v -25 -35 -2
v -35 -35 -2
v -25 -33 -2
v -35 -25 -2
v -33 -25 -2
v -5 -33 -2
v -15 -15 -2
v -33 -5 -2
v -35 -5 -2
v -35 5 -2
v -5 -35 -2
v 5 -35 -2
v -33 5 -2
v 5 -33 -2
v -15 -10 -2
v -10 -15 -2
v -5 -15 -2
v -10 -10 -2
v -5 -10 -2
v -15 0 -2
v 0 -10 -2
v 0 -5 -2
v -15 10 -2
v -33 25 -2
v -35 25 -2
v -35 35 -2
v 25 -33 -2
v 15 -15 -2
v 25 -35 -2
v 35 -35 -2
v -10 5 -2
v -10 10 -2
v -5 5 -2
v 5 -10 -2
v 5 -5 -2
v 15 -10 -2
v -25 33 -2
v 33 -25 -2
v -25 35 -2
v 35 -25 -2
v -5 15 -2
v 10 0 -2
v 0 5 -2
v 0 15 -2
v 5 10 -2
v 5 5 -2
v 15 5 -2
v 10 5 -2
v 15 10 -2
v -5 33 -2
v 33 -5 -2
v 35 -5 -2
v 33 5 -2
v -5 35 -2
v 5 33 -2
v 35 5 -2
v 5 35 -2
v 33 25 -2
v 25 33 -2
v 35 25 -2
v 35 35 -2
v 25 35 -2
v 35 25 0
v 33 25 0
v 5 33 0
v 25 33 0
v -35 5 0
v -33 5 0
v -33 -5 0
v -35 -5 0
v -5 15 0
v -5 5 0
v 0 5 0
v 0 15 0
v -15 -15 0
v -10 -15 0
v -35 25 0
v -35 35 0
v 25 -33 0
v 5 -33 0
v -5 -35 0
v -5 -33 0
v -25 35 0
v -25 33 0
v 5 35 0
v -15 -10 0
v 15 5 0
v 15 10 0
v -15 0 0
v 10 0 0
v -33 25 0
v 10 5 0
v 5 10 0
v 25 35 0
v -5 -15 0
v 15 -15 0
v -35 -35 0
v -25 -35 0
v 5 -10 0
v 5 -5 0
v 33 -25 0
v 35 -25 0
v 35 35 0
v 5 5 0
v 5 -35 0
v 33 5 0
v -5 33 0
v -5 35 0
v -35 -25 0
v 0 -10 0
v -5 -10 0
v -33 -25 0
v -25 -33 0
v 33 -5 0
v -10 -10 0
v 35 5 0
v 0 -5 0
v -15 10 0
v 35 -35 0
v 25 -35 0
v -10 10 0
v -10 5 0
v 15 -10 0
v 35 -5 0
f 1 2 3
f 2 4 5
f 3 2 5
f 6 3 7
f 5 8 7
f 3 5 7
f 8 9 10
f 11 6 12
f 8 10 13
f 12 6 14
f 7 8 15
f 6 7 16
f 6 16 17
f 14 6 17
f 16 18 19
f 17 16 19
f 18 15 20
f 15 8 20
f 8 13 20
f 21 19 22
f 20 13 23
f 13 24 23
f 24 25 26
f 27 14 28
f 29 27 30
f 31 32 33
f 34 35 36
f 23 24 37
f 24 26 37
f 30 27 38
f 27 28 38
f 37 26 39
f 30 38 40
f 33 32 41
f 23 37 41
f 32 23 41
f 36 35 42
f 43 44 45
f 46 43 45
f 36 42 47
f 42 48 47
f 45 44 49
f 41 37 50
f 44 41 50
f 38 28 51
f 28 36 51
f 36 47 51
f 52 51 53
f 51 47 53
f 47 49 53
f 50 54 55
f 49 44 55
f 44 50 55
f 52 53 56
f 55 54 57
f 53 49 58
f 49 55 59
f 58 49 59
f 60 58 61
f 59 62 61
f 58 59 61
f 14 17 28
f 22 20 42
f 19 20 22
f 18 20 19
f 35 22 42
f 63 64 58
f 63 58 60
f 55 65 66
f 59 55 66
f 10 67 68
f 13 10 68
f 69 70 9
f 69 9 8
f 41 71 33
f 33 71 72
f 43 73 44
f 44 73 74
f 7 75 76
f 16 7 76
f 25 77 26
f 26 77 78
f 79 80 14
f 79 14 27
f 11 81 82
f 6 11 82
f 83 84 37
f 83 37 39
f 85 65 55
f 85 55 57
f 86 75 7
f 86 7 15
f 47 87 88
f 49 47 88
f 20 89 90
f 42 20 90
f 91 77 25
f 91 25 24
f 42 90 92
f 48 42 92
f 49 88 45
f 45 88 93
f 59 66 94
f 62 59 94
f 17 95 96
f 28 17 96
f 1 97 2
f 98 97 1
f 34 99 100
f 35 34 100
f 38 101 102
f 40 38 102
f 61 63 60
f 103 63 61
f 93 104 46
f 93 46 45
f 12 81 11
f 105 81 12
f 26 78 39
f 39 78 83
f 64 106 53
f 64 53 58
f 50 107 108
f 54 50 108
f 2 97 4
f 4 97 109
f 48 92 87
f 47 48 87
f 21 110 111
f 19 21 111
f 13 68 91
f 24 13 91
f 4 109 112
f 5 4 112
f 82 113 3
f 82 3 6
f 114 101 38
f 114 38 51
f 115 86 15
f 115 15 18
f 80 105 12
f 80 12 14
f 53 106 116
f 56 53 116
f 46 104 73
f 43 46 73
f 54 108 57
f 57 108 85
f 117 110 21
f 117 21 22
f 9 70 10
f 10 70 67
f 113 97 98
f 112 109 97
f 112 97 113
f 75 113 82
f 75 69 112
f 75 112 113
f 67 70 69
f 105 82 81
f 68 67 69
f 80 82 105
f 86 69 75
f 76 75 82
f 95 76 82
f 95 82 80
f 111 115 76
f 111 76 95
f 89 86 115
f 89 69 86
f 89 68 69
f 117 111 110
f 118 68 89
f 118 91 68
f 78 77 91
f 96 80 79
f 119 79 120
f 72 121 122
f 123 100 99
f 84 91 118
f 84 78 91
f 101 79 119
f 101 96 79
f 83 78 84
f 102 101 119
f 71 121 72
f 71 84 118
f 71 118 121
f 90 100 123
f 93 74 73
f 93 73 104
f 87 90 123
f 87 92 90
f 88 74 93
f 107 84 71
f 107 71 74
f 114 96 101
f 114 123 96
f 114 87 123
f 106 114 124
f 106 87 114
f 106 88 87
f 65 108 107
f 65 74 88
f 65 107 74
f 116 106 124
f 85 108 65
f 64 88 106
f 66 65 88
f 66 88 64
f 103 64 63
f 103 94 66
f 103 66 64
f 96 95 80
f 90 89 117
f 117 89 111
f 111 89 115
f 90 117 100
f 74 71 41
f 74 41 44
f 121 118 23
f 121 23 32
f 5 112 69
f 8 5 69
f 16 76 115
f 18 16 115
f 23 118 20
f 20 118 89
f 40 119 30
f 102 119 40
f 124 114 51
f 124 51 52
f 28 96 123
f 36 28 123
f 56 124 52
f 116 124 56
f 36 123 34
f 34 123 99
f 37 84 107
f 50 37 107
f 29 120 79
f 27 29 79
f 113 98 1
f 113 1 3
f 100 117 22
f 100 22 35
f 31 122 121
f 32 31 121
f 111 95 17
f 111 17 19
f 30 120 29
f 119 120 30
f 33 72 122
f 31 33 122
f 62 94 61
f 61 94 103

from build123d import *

# Parameters (mm, degrees)
SKETCH1_W           = 70
SKETCH1_H           = 70
BOSS_EXTRUDE1_DEPTH = 2
SKETCH2_W           = 2
SKETCH2_H           = 20
SKETCH2_W_2         = 20
SKETCH2_H_2         = 2
CUT_EXTRUDE1_DEPTH  = 2
SKETCH3_W           = 5
SKETCH3_H           = 5
CUT_EXTRUDE5_DEPTH  = 10


with BuildPart() as part:
    # Sketch1 → Boss-Extrude1 (new body)
    with BuildSketch(Plane.XY):
        Rectangle(SKETCH1_W, SKETCH1_H)
    extrude(amount=-BOSS_EXTRUDE1_DEPTH)

    # Sketch2 → Cut-Extrude1 (cut)
    with BuildSketch(Plane.XY):
        with Locations((-34, 15)):
            Rectangle(SKETCH2_W, SKETCH2_H)
        with Locations((-34, -15)):
            Rectangle(SKETCH2_W, SKETCH2_H)
        with Locations((-15, -34)):
            Rectangle(SKETCH2_W_2, SKETCH2_H_2)
        with Locations((15, -34)):
            Rectangle(SKETCH2_W_2, SKETCH2_H_2)
        with Locations((34, -15)):
            Rectangle(SKETCH2_W, SKETCH2_H)
        with Locations((34, 15)):
            Rectangle(SKETCH2_W, SKETCH2_H)
        with Locations((15, 34)):
            Rectangle(SKETCH2_W_2, SKETCH2_H_2)
        with Locations((-15, 34)):
            Rectangle(SKETCH2_W_2, SKETCH2_H_2)
    extrude(amount=-CUT_EXTRUDE1_DEPTH, mode=Mode.SUBTRACT)

    # Sketch3 → Cut-Extrude5 (cut)
    with BuildSketch(Plane.XY):
        with Locations((-12.5, 7.5)):
            Rectangle(SKETCH3_W, SKETCH3_H)
        with Locations((-12.5, 2.5)):
            Rectangle(SKETCH3_W, SKETCH3_H)
        with Locations((-7.5, 2.5)):
            Rectangle(SKETCH3_W, SKETCH3_H)
        with Locations((-2.5, 2.5)):
            Rectangle(SKETCH3_W, SKETCH3_H)
        with Locations((2.5, 2.5)):
            Rectangle(SKETCH3_W, SKETCH3_H)
        with Locations((7.5, 2.5)):
            Rectangle(SKETCH3_W, SKETCH3_H)
        with Locations((7.5, 7.5)):
            Rectangle(SKETCH3_W, SKETCH3_H)
        with Locations((12.5, 7.5)):
            Rectangle(SKETCH3_W, SKETCH3_H)
        with Locations((-2.5, 7.5)):
            Rectangle(SKETCH3_W, SKETCH3_H)
        with Locations((-2.5, 12.5)):
            Rectangle(SKETCH3_W, SKETCH3_H)
        with Locations((-12.5, -12.5)):
            Rectangle(SKETCH3_W, SKETCH3_H)
        with Locations((-2.5, -12.5)):
            Rectangle(SKETCH3_W, SKETCH3_H)
        with Locations((2.5, -12.5)):
            Rectangle(SKETCH3_W, SKETCH3_H)
        with Locations((7.5, -12.5)):
            Rectangle(SKETCH3_W, SKETCH3_H)
        with Locations((12.5, -12.5)):
            Rectangle(SKETCH3_W, SKETCH3_H)
        with Locations((2.5, -7.5)):
            Rectangle(SKETCH3_W, SKETCH3_H)
    extrude(amount=-CUT_EXTRUDE5_DEPTH, mode=Mode.SUBTRACT)


solid = part.part
